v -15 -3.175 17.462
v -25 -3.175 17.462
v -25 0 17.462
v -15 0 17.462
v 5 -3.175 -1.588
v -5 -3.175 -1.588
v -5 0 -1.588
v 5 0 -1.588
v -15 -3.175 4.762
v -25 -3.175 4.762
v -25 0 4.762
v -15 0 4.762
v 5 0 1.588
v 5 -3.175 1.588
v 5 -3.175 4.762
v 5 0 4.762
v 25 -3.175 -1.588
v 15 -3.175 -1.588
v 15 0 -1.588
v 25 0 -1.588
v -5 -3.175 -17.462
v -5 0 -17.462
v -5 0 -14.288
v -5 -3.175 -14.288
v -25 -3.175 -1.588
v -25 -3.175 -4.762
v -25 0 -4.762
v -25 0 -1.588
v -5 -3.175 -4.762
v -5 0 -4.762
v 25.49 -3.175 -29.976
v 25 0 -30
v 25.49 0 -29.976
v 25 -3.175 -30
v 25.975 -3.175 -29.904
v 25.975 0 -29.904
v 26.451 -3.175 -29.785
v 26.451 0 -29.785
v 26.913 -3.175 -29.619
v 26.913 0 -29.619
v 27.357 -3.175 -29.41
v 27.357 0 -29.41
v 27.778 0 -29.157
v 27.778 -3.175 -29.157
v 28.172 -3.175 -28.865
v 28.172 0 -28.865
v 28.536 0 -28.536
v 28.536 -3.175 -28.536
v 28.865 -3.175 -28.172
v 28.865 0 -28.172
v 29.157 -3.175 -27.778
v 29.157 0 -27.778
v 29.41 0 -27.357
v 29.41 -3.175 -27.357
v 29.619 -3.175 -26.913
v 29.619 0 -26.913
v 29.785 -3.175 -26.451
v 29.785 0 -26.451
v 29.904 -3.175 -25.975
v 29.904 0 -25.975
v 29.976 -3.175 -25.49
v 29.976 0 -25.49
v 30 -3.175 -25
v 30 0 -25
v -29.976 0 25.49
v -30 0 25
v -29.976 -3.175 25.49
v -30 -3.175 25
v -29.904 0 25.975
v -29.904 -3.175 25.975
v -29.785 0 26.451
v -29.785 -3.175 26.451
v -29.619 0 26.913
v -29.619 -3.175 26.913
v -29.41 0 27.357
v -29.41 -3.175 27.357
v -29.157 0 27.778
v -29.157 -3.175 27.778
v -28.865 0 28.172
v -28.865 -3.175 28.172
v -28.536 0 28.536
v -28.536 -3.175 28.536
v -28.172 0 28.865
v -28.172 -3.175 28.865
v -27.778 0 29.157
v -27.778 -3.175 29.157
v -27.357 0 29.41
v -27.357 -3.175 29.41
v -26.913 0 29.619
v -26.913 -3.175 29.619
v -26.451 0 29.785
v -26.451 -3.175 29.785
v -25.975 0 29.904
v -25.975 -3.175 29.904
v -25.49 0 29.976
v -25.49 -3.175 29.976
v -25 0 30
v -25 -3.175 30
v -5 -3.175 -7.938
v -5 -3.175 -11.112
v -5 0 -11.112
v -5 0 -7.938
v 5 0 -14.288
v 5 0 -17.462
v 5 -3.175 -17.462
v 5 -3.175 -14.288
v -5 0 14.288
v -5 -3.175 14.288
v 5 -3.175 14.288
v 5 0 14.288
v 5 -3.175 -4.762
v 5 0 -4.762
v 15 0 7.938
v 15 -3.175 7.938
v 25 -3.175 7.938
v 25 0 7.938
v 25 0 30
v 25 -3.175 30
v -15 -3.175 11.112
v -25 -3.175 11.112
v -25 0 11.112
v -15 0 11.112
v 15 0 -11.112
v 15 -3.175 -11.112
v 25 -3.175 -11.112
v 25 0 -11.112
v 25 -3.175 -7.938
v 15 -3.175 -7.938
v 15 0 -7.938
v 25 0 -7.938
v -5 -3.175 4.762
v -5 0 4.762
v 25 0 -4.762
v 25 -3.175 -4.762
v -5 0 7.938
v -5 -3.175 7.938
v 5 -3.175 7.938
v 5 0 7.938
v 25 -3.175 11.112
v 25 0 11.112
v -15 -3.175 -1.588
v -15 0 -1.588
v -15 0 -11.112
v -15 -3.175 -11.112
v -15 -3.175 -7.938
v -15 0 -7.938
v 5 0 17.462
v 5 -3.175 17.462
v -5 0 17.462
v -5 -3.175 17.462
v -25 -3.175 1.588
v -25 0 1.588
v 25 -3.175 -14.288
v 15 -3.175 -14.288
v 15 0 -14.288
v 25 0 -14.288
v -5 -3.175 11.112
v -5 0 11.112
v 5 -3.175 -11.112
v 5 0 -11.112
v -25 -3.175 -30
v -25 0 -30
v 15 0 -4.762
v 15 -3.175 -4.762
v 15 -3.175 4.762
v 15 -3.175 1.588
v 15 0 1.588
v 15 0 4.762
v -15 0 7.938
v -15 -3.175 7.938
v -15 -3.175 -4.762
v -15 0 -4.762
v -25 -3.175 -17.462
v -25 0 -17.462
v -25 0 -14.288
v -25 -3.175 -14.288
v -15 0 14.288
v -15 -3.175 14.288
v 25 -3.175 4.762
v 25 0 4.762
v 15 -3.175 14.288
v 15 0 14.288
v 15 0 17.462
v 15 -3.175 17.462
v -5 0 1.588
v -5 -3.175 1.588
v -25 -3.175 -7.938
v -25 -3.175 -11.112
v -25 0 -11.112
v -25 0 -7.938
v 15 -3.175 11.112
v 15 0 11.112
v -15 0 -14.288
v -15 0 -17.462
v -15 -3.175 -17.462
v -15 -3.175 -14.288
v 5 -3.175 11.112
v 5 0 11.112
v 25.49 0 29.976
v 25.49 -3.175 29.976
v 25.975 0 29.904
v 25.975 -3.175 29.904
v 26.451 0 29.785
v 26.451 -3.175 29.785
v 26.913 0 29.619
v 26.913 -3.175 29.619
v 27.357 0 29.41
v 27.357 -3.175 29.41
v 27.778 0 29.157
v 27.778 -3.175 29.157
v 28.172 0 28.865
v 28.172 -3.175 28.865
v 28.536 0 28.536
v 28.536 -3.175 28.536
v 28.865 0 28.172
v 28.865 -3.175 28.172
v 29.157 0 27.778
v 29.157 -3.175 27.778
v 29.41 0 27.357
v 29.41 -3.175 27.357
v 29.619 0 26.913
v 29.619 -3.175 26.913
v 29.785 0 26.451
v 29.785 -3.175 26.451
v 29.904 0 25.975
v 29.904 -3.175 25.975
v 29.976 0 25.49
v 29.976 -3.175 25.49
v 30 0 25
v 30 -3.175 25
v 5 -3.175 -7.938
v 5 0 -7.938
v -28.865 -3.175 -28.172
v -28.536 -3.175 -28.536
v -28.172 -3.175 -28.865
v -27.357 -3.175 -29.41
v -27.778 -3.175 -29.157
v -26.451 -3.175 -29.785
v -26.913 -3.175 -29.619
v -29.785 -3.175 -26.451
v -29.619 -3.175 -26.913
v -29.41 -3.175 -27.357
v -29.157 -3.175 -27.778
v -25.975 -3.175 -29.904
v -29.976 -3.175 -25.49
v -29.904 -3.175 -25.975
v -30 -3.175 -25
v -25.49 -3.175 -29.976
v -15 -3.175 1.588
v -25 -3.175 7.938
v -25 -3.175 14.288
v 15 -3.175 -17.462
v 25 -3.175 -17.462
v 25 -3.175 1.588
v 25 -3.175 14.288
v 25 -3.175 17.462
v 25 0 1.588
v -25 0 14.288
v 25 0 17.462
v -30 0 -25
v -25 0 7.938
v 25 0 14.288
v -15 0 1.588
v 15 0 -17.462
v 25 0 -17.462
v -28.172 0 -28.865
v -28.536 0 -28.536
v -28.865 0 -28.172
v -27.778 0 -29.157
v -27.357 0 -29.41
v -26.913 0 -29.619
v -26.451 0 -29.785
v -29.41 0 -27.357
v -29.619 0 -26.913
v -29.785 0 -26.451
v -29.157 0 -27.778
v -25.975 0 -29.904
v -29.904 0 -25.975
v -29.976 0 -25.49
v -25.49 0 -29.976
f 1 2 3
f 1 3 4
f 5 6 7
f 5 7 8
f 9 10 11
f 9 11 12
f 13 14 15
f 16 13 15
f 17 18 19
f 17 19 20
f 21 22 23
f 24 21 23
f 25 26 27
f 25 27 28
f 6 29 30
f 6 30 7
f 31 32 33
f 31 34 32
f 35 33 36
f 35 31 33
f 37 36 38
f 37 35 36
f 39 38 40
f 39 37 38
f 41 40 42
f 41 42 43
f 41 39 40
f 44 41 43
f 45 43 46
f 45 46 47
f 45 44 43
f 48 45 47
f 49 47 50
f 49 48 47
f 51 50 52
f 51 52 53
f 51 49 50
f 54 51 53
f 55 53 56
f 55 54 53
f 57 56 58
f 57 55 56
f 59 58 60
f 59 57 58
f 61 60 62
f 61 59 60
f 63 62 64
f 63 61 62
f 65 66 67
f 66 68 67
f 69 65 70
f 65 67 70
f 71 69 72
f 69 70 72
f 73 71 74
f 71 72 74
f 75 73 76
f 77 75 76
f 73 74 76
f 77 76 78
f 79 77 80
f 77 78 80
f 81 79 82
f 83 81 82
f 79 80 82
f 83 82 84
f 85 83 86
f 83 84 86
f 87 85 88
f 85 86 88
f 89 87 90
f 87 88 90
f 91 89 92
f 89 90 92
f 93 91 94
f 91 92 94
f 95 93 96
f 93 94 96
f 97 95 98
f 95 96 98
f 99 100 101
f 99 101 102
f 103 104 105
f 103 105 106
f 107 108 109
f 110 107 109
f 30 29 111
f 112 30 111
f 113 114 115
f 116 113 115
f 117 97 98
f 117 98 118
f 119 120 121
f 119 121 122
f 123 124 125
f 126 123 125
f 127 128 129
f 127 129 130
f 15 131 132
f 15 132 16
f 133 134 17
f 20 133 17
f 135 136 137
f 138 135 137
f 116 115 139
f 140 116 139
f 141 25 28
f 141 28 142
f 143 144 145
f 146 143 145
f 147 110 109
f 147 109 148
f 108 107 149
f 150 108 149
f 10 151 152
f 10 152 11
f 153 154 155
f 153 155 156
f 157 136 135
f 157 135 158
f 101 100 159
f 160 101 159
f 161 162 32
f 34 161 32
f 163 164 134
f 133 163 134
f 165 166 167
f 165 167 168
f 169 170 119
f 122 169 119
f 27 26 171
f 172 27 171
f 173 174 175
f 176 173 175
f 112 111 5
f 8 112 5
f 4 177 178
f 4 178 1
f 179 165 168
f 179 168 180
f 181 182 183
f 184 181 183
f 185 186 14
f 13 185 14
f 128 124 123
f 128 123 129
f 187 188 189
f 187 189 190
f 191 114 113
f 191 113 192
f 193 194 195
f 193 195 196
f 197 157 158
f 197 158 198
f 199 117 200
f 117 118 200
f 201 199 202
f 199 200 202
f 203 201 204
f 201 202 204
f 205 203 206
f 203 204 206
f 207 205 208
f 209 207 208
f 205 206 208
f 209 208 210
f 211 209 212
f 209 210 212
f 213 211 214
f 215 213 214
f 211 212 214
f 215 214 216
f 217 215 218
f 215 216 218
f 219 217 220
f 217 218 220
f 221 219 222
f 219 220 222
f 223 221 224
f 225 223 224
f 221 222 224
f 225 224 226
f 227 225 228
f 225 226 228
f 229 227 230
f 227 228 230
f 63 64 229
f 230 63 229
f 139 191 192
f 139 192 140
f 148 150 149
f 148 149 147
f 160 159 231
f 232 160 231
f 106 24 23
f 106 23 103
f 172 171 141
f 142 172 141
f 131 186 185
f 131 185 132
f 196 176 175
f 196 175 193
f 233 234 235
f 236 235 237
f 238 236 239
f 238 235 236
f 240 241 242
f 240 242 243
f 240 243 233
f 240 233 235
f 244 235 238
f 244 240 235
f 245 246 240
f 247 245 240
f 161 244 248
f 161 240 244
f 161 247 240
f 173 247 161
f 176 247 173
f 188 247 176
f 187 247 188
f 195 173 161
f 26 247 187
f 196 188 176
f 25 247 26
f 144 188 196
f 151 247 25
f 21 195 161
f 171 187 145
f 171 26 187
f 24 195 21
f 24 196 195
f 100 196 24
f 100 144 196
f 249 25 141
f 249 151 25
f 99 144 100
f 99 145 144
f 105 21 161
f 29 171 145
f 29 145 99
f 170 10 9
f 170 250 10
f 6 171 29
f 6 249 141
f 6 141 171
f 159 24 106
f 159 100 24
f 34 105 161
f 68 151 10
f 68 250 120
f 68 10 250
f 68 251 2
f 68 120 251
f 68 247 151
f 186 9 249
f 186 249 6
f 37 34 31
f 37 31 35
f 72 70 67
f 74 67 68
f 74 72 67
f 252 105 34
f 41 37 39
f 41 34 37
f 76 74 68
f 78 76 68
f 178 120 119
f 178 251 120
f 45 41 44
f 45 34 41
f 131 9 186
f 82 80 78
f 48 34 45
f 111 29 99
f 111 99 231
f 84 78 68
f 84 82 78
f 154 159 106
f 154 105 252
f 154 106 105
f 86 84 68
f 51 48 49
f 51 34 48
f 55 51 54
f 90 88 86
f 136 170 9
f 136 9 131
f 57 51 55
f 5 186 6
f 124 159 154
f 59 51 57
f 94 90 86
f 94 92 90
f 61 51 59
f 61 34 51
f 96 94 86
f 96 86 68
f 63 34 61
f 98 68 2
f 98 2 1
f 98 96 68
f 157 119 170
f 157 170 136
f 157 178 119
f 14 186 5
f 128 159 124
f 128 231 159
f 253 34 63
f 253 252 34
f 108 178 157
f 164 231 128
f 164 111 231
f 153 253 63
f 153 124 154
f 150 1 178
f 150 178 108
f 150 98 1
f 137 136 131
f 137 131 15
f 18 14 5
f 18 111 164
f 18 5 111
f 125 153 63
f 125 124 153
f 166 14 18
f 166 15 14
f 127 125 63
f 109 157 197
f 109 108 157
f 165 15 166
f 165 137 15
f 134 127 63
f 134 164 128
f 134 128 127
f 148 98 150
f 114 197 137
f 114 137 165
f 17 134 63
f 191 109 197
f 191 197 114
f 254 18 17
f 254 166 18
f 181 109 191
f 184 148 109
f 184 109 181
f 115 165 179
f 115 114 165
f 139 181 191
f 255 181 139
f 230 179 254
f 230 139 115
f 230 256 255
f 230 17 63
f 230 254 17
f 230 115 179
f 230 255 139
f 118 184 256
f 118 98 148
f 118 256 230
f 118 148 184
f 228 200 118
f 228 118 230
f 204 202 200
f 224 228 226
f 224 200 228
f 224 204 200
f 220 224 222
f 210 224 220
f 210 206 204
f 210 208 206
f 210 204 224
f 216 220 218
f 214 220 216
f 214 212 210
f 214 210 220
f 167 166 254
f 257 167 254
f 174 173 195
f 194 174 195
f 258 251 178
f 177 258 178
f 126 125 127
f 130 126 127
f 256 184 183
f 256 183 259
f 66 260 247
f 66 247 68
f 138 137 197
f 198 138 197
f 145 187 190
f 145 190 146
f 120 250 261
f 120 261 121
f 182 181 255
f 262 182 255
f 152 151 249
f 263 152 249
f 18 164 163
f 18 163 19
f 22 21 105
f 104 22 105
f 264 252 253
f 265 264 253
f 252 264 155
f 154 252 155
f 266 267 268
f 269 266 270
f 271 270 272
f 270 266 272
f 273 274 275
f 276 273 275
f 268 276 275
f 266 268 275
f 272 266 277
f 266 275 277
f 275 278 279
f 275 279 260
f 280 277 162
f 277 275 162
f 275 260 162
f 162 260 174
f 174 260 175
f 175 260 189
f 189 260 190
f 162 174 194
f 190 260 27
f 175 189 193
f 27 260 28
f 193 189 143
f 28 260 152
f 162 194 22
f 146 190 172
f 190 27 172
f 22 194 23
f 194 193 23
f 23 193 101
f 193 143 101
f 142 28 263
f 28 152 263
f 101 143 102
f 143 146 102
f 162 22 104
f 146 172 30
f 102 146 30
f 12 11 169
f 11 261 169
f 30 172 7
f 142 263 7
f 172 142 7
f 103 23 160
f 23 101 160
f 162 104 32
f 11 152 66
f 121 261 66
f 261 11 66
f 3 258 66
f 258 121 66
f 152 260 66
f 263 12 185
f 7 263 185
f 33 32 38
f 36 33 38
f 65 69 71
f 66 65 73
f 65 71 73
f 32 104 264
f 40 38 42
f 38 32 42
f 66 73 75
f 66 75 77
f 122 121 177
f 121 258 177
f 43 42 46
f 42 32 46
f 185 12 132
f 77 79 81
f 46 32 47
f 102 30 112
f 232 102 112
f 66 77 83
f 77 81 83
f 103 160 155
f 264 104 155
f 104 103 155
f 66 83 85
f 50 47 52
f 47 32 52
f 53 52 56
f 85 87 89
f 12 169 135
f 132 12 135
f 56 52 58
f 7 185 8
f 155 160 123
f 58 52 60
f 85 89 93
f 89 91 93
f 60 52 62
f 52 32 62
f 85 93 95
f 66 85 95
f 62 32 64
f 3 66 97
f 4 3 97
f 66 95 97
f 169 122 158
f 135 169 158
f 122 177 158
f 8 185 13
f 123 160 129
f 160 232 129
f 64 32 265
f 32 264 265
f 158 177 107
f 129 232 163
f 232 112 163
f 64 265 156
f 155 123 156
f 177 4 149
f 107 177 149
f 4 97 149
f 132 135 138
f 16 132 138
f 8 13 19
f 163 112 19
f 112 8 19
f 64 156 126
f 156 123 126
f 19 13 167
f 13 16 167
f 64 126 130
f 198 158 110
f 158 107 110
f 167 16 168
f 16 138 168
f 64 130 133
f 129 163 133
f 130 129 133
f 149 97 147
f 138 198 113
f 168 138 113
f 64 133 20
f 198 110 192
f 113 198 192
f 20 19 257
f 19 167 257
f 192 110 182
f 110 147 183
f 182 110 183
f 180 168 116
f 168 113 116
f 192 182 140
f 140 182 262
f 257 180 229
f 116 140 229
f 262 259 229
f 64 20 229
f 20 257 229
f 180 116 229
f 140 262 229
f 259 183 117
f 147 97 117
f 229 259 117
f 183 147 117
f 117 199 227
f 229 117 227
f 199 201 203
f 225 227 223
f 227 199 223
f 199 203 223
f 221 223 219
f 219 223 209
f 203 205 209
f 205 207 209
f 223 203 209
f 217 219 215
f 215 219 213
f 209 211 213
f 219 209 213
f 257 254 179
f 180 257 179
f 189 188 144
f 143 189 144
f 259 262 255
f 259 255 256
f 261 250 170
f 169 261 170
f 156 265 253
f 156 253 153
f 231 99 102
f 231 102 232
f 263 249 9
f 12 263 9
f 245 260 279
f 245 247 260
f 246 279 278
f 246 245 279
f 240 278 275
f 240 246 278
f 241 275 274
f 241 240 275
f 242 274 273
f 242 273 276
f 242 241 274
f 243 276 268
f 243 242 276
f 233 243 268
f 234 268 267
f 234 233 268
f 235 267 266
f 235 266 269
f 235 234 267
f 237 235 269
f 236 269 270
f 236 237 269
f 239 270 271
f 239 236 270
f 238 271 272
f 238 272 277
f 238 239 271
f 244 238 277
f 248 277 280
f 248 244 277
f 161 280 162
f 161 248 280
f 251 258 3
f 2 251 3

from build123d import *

# Parameters (mm, degrees)
F0_W     = 60
F0_H     = 60
F1_DEPTH = 3.175
F2_W     = 10
F2_H     = 3.175
F3_DEPTH = 3.176
F4_R     = 5


# Not quite as in the source:
# - a length typed as a fraction of an inch, garbled in the dataset ("3 / 203.2 mm" for 3/8 in), is restored


with BuildPart() as f1:
    # F0 (on Front) → F1 (new body)
    with BuildSketch(Plane.XZ):
        Rectangle(F0_W, F0_H)
    extrude(amount=F1_DEPTH)

    # F2 (on face) → F3 (cut, through all)
    with BuildSketch(Plane.XZ.offset(3.175)):
        with Locations((-20, -15.875)):
            Rectangle(F2_W, F2_H)
        with Locations((0, -15.875)):
            Rectangle(F2_W, F2_H)
        with Locations((20, -15.875)):
            Rectangle(F2_W, F2_H)
        with Locations((-20, -9.525)):
            Rectangle(F2_W, F2_H)
        with Locations((0, -9.525)):
            Rectangle(F2_W, F2_H)
        with Locations((20, -9.525)):
            Rectangle(F2_W, F2_H)
        with Locations((-20, -3.175)):
            Rectangle(F2_W, F2_H)
        with Locations((0, -3.175)):
            Rectangle(F2_W, F2_H)
        with Locations((20, -3.175)):
            Rectangle(F2_W, F2_H)
        with Locations((-20, 3.175)):
            Rectangle(F2_W, F2_H)
        with Locations((0, 3.175)):
            Rectangle(F2_W, F2_H)
        with Locations((20, 3.175)):
            Rectangle(F2_W, F2_H)
        with Locations((-20, 9.525)):
            Rectangle(F2_W, F2_H)
        with Locations((0, 9.525)):
            Rectangle(F2_W, F2_H)
        with Locations((20, 9.525)):
            Rectangle(F2_W, F2_H)
        with Locations((-20, 15.875)):
            Rectangle(F2_W, F2_H)
        with Locations((0, 15.875)):
            Rectangle(F2_W, F2_H)
        with Locations((20, 15.875)):
            Rectangle(F2_W, F2_H)
    extrude(amount=-F3_DEPTH, mode=Mode.SUBTRACT)

    # F4
    f4_edges = [f1.edges().sort_by_distance(p)[0] for p in [
        (-30, -1.5875, 30),
        (30, -1.5875, 30),
        (-30, -1.5875, -30),
        (30, -1.5875, -30),
    ]]
    fillet(f4_edges, radius=F4_R)


solid = f1.part
